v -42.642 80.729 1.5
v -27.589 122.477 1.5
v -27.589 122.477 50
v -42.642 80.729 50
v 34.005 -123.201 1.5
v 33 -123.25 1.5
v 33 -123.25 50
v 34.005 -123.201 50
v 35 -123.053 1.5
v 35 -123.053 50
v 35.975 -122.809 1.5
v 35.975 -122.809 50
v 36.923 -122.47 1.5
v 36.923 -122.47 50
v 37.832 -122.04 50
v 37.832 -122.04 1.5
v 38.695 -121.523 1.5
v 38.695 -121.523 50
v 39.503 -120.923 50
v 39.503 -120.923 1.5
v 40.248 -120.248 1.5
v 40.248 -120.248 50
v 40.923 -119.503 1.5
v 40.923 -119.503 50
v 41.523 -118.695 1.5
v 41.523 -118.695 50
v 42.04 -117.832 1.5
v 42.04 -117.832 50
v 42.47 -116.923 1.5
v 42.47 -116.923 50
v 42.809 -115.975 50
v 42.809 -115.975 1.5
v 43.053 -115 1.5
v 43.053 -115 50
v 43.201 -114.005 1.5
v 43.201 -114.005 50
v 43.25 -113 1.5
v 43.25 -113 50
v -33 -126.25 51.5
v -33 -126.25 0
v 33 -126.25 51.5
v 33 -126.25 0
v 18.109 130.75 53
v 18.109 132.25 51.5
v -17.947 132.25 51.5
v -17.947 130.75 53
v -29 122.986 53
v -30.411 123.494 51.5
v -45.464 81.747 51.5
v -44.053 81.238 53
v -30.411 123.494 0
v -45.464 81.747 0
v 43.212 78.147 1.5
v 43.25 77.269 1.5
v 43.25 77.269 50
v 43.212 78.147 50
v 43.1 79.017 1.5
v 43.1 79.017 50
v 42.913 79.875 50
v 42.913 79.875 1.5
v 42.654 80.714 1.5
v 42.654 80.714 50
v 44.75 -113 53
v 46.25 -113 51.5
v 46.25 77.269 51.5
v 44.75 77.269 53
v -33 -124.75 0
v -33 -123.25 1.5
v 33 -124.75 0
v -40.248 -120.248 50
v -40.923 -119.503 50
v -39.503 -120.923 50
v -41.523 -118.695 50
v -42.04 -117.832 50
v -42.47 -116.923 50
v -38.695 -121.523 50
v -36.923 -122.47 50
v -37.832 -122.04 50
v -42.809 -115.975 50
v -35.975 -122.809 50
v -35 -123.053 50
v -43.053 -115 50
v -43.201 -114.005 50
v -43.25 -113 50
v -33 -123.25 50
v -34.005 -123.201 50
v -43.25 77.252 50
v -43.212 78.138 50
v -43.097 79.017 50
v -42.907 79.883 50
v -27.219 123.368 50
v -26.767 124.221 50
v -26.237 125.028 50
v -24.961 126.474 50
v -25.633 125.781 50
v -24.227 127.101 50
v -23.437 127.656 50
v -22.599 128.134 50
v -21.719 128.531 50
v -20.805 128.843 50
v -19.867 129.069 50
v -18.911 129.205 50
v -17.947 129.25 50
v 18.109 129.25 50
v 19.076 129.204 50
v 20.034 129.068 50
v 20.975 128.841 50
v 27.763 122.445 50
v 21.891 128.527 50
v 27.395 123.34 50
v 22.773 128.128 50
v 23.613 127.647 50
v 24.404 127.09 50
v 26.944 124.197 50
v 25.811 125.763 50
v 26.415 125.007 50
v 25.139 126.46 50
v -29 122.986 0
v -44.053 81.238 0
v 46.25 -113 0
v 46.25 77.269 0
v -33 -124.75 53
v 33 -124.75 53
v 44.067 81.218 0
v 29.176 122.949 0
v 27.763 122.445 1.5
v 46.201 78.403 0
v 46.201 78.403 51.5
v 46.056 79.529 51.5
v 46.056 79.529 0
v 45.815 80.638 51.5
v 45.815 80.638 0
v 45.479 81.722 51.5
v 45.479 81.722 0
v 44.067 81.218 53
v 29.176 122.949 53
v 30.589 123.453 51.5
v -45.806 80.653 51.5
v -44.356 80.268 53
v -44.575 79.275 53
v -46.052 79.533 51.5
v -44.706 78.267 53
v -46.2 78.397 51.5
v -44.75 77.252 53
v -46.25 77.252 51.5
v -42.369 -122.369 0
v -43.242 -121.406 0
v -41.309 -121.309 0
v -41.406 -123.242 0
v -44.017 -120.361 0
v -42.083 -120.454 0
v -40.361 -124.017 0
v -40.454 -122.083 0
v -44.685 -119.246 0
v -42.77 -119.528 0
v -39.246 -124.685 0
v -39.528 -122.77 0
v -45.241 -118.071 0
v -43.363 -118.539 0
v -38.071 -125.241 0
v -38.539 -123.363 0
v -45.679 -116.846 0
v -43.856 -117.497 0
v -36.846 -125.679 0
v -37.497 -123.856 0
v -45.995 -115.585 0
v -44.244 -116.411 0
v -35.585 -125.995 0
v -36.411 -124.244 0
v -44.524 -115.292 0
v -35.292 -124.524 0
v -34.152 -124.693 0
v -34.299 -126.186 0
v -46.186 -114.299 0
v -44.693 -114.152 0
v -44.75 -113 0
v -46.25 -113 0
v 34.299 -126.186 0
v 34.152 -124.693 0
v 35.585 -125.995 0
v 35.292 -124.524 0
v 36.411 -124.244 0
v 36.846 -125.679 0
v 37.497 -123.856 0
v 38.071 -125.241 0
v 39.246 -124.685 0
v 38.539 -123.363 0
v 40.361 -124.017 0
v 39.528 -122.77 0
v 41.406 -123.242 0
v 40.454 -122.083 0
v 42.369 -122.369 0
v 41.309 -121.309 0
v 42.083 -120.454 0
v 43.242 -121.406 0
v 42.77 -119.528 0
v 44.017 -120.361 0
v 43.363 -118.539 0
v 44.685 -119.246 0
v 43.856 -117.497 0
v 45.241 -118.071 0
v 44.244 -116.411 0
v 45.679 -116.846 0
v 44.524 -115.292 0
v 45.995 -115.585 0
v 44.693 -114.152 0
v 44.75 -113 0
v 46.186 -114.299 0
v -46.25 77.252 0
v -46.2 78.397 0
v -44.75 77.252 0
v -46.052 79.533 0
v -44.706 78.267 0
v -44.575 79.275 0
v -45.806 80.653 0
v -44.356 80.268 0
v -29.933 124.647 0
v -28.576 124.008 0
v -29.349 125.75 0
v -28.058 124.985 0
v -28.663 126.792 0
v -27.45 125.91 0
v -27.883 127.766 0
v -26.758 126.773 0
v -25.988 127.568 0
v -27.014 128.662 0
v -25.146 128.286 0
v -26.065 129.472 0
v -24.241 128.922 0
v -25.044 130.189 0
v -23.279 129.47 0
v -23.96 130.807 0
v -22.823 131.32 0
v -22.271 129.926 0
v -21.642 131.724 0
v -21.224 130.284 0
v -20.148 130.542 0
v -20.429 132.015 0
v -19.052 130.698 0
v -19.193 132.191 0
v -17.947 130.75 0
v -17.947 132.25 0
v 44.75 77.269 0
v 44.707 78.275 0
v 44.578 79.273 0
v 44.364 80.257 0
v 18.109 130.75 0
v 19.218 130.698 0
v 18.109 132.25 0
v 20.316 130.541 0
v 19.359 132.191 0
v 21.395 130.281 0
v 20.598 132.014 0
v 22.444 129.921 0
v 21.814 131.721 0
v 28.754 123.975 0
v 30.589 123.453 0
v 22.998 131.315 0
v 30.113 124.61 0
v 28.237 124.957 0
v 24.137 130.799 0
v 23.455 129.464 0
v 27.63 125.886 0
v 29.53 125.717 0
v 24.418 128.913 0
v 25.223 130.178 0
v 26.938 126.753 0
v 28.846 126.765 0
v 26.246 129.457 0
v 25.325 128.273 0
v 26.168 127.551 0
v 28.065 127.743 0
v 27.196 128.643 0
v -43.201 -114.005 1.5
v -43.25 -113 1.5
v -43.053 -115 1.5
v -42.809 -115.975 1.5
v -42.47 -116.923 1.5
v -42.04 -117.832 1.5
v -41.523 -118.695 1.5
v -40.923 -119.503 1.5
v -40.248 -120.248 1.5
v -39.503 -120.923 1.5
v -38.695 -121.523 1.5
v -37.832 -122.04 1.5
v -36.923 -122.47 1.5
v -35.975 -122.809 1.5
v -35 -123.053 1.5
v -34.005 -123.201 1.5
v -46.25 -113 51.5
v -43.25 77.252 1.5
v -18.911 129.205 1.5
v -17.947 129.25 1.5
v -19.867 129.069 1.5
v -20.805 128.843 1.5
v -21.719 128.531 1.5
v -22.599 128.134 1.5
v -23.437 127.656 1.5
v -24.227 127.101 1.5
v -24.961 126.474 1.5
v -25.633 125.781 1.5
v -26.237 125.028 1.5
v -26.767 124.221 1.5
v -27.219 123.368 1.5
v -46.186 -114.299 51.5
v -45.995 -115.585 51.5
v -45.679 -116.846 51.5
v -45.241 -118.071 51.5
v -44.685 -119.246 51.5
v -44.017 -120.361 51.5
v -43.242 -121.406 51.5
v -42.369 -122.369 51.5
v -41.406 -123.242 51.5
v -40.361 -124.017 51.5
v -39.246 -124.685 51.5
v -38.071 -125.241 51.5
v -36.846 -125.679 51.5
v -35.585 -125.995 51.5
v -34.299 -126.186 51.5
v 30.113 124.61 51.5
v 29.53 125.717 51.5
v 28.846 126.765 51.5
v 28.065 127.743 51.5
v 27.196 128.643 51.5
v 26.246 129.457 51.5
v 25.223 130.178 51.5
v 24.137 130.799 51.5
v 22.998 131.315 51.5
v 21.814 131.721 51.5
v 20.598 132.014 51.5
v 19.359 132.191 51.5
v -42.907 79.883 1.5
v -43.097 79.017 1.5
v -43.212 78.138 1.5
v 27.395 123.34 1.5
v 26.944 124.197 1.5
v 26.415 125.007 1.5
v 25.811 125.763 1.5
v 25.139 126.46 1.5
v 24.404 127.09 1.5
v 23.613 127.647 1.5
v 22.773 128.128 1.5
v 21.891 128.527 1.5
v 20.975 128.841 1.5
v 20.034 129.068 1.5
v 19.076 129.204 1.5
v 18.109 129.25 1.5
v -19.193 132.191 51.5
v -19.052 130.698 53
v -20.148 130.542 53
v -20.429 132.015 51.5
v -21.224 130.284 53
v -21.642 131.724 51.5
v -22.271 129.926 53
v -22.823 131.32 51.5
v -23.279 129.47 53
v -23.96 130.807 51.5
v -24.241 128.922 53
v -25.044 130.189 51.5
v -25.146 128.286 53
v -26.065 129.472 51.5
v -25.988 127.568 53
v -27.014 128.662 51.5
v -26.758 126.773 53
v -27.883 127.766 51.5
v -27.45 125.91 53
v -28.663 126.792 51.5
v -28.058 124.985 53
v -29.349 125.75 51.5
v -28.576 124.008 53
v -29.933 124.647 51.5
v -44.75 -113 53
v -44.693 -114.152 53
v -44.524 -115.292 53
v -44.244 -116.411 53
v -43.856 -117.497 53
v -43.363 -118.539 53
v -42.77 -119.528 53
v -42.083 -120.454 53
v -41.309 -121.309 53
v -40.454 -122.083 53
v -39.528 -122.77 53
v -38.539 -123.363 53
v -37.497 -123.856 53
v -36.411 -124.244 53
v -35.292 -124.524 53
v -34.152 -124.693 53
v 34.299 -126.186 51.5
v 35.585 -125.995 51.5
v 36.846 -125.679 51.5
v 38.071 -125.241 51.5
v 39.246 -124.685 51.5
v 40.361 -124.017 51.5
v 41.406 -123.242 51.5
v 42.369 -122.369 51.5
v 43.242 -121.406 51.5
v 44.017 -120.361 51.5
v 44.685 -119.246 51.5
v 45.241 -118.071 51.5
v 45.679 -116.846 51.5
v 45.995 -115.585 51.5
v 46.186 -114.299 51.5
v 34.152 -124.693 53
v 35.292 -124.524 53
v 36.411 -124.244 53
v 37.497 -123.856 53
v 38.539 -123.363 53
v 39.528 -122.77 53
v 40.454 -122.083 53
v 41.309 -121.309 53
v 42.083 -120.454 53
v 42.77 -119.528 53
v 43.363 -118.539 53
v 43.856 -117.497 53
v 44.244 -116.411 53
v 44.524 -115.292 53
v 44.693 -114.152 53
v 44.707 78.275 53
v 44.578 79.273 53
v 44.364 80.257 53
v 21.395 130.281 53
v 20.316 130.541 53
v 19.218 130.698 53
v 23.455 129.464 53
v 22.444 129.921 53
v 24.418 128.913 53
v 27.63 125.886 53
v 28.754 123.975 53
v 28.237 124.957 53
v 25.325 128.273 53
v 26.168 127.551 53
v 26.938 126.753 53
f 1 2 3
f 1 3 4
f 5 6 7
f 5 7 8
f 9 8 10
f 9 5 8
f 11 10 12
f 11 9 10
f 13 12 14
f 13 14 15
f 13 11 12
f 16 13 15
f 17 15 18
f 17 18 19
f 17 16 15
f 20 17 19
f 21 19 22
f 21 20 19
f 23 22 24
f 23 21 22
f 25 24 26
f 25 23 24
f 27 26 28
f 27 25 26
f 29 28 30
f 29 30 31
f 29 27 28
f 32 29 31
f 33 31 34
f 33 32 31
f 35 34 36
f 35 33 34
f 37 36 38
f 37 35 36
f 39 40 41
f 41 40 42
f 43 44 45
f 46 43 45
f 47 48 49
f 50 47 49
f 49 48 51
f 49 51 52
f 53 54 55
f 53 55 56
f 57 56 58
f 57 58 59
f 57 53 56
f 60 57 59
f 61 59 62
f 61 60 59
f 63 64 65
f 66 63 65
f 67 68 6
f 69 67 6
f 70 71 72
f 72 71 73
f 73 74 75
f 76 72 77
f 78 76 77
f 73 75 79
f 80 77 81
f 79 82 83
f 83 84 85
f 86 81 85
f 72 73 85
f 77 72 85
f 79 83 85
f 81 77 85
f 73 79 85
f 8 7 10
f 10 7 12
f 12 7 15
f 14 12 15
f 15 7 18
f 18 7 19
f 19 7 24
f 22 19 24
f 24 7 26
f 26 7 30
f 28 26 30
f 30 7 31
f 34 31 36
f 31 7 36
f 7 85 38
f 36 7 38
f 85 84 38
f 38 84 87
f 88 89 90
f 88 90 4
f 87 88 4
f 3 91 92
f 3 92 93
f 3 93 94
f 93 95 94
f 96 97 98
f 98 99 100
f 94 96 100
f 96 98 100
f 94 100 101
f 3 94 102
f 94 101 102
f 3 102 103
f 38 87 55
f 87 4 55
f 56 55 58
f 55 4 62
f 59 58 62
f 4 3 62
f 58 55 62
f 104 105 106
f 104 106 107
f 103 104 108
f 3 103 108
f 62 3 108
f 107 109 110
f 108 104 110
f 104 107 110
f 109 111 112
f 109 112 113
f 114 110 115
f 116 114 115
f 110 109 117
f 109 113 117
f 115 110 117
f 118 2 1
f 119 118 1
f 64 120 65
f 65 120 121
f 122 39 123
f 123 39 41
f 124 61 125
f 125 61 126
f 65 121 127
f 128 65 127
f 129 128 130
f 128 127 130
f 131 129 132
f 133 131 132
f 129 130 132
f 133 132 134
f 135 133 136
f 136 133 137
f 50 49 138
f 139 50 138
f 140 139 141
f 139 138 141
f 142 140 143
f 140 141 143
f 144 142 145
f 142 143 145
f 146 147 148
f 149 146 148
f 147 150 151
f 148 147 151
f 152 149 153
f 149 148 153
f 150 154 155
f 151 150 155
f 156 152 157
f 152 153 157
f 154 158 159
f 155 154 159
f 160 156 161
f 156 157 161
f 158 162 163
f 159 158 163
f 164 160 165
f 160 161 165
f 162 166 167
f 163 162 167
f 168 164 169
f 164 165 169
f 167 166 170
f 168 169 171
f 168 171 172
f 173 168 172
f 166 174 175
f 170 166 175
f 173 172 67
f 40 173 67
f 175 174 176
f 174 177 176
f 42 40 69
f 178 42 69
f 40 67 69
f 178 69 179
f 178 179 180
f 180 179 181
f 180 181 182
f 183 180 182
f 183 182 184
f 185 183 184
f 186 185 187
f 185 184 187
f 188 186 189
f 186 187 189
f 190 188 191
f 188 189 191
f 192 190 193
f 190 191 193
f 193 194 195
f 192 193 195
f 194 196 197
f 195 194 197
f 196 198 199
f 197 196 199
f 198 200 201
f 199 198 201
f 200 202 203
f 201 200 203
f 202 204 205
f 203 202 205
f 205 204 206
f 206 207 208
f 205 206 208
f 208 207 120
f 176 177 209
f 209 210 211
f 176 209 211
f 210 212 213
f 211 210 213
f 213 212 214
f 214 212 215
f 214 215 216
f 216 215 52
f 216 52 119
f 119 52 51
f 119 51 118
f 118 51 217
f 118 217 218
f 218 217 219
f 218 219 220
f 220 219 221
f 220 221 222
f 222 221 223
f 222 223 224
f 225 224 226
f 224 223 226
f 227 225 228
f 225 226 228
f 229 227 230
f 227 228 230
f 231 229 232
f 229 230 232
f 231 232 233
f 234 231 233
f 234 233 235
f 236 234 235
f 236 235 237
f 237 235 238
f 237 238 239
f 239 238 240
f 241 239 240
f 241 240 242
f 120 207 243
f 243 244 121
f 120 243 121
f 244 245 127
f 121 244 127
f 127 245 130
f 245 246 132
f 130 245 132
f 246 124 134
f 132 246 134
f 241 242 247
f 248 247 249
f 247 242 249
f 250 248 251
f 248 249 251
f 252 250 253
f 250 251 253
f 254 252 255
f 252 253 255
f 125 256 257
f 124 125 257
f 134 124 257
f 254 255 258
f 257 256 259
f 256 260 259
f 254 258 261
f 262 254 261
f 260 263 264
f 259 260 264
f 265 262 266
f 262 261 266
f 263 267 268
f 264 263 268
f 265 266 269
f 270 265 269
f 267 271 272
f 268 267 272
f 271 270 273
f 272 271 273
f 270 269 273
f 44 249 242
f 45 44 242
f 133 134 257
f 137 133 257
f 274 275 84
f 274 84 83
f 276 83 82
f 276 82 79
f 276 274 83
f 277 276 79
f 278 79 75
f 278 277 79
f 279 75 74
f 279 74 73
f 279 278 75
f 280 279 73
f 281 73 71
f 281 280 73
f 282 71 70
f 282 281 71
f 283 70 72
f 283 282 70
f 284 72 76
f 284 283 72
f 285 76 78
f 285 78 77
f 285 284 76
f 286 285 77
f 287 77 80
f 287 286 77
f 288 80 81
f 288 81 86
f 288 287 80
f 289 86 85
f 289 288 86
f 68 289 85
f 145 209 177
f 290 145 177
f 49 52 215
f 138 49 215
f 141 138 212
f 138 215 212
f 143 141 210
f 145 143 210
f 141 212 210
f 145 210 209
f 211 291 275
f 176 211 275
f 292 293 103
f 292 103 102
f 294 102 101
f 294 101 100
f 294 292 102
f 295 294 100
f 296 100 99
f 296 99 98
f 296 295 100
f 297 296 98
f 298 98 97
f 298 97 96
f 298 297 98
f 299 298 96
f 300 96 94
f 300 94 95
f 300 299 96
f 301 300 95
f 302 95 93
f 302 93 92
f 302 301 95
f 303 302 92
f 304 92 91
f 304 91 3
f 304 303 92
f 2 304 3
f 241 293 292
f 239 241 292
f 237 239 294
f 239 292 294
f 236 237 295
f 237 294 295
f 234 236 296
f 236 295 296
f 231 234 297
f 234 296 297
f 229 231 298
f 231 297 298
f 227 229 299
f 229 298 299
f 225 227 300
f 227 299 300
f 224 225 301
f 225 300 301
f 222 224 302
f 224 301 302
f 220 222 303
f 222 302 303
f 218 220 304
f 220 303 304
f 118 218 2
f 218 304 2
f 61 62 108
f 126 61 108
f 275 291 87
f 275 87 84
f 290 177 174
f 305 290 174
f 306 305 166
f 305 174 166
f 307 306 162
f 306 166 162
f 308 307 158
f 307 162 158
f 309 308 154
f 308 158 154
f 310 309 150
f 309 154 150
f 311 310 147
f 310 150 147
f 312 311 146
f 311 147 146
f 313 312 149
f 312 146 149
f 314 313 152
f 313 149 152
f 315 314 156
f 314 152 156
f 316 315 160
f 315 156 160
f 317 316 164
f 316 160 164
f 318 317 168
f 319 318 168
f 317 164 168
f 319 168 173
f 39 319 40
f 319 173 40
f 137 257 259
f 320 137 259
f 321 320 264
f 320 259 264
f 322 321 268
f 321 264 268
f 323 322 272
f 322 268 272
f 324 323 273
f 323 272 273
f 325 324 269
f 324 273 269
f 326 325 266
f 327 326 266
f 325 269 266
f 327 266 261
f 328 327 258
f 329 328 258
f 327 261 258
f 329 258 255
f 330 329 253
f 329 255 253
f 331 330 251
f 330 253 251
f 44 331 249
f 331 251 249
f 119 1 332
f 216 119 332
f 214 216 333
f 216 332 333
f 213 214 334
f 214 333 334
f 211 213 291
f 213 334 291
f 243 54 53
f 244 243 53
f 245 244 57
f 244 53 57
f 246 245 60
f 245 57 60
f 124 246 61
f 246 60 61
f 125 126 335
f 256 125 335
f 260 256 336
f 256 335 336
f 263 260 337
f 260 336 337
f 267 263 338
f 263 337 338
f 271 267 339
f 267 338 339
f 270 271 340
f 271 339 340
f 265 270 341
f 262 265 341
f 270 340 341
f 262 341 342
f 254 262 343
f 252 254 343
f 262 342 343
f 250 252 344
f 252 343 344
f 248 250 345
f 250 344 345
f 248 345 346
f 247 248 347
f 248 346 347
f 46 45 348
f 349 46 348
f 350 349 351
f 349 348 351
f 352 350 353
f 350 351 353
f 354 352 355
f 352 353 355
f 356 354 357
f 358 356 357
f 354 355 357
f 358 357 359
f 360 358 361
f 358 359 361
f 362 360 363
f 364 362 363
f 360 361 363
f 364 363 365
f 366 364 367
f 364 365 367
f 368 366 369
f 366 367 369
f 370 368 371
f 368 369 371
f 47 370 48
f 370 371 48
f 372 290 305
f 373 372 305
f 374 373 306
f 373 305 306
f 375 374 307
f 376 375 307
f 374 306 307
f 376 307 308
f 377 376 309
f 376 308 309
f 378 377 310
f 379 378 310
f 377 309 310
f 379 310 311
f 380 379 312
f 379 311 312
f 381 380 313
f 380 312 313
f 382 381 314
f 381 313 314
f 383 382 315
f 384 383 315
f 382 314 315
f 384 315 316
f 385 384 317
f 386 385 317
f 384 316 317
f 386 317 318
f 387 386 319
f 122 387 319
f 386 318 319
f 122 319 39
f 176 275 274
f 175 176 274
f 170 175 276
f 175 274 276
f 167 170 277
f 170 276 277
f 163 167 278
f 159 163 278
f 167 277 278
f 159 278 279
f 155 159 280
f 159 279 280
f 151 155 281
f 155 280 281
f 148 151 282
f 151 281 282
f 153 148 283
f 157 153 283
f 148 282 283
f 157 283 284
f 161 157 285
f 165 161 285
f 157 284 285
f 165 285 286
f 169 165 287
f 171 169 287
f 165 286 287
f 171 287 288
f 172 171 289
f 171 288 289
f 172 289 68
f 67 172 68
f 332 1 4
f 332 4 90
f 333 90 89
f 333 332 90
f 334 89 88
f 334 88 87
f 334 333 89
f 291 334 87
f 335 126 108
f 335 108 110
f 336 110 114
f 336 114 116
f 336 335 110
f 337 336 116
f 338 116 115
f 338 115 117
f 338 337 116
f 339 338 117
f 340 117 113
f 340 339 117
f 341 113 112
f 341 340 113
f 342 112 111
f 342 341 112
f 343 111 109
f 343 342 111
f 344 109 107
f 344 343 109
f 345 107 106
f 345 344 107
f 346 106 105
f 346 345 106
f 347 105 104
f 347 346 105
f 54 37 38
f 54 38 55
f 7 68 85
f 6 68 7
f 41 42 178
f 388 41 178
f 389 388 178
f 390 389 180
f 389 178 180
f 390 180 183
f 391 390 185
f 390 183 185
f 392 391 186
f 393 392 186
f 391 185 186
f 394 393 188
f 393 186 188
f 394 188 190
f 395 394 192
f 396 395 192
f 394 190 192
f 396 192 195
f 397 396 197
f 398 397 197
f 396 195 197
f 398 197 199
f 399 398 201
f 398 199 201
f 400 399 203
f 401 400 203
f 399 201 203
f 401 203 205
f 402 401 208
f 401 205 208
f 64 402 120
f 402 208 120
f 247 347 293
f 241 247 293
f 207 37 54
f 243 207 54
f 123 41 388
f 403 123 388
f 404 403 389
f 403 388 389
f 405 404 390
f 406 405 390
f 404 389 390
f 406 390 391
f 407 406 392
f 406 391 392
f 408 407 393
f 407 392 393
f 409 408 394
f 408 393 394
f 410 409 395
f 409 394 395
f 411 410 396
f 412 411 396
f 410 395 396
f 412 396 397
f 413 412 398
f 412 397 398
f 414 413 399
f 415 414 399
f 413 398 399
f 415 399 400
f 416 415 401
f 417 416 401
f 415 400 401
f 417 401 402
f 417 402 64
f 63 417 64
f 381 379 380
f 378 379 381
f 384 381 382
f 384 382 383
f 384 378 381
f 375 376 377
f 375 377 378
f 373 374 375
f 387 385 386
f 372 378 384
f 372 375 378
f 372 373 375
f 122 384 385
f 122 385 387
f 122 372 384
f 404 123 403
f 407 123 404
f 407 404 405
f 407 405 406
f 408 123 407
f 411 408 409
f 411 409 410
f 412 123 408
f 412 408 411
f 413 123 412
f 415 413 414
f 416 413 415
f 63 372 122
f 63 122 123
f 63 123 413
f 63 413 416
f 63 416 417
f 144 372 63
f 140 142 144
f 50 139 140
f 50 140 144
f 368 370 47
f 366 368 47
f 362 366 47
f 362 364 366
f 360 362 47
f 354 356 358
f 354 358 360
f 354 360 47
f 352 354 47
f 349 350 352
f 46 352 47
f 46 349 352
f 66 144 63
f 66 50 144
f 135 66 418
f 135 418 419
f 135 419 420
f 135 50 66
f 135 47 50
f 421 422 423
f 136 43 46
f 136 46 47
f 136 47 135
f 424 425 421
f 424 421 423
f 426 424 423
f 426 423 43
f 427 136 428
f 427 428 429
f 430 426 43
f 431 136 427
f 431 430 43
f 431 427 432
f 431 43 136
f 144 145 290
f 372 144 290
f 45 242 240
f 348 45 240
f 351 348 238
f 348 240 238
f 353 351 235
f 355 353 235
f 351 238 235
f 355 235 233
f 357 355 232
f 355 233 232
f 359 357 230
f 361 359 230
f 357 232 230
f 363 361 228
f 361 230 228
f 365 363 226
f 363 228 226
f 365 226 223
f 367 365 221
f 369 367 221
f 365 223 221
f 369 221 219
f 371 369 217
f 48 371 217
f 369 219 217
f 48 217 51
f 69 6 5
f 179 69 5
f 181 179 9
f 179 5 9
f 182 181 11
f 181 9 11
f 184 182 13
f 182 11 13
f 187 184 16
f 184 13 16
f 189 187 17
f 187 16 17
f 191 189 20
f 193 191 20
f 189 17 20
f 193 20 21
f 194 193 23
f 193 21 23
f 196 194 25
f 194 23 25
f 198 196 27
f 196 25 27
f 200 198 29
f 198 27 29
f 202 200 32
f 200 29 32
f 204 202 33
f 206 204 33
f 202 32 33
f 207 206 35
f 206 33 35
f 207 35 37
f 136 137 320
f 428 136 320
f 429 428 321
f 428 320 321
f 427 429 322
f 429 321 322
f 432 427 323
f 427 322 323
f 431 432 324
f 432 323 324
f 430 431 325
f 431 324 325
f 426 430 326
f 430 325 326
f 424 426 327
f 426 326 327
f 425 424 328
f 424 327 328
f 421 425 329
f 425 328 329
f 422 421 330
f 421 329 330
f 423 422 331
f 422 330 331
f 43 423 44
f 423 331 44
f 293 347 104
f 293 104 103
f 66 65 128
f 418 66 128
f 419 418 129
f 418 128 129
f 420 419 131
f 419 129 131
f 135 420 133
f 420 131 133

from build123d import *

# Parameters (mm, degrees)
BOSS_EXTRUDE1_DEPTH = 50
BOSS_EXTRUDE2_DEPTH = 3
CHAMFER1_SIZE       = 1.5


with BuildPart() as part:
    # Sketch1 → Boss-Extrude1 (new body)
    with BuildSketch(Plane.XY):
        with BuildLine():
            Line((-46.25, 77.25220626), (-46.25, -113))
            ThreePointArc((-46.25, -113), (-42.369164851, -122.369164851), (-33, -126.25))
            Line((-33, -126.25), (33, -126.25))
            ThreePointArc((33, -126.25), (42.369164851, -122.369164851), (46.25, -113))
            Line((46.25, -113), (46.25, 77.269287137))
            ThreePointArc((46.25, 77.269287137), (46.055906569, 79.528889681), (45.479312656, 81.722292374))
            Line((45.479312656, 81.722292374), (30.588501914, 123.453005237))
            ThreePointArc((30.588501914, 123.453005237), (25.743329046, 129.829700351), (18.109189258, 132.25))
            Line((18.109189258, 132.25), (-17.946852503, 132.25))
            ThreePointArc((-17.946852503, 132.25), (-25.56302687, 129.842342367), (-30.411330997, 123.494360454))
            Line((-30.411330997, 123.494360454), (-45.464478493, 81.746566714))
            ThreePointArc((-45.464478493, 81.746566714), (-46.052142354, 79.53345153), (-46.25, 77.25220626))
        make_face()
        with BuildLine():
            ThreePointArc((-43.25, -113), (-40.247844507, -120.247844507), (-33, -123.25))
            Line((-33, -123.25), (33, -123.25))
            ThreePointArc((33, -123.25), (40.247844507, -120.247844507), (43.25, -113))
            Line((43.25, -113), (43.25, 77.269287137))
            ThreePointArc((43.25, 77.269287137), (43.099852252, 79.017281558), (42.653807903, 80.714064773))
            Line((42.653807903, 80.714064773), (27.762997162, 122.444777636))
            ThreePointArc((27.762997162, 122.444777636), (24.014844566, 127.377692725), (18.109189258, 129.25))
            Line((18.109189258, 129.25), (-17.946852503, 129.25))
            ThreePointArc((-17.946852503, 129.25), (-23.838610033, 127.387472397), (-27.589184923, 122.476769408))
            Line((-27.589184923, 122.476769408), (-42.642332419, 80.728975668))
            ThreePointArc((-42.642332419, 80.728975668), (-43.096940311, 79.016943167), (-43.25, 77.25220626))
            Line((-43.25, 77.25220626), (-43.25, -113))
        make_face(mode=Mode.SUBTRACT)
    extrude(amount=BOSS_EXTRUDE1_DEPTH)

    # Sketch3 → Boss-Extrude2 (add)
    with BuildSketch(Plane.XY.offset(50)):
        with BuildLine():
            Line((-46.25, 77.25220626), (-46.25, -113))
            ThreePointArc((-46.25, -113), (-42.369164851, -122.369164851), (-33, -126.25))
            Line((-33, -126.25), (33, -126.25))
            ThreePointArc((33, -126.25), (42.369164851, -122.369164851), (46.25, -113))
            Line((46.25, -113), (46.25, 77.269287137))
            ThreePointArc((46.25, 77.269287137), (46.055906569, 79.528889681), (45.479312656, 81.722292374))
            Line((45.479312656, 81.722292374), (30.588501914, 123.453005237))
            ThreePointArc((30.588501914, 123.453005237), (25.743329046, 129.829700351), (18.109189258, 132.25))
            Line((18.109189258, 132.25), (-17.946852503, 132.25))
            ThreePointArc((-17.946852503, 132.25), (-25.56302687, 129.842342367), (-30.411330997, 123.494360454))
            Line((-30.411330997, 123.494360454), (-45.464478493, 81.746566714))
            ThreePointArc((-45.464478493, 81.746566714), (-46.052142354, 79.53345153), (-46.25, 77.25220626))
        make_face()
    extrude(amount=BOSS_EXTRUDE2_DEPTH)

    # Chamfer1
    chamfer1_edges = [part.edges().sort_by_distance(p)[0] for p in [
        (0, -123.25, 0),
        (40.247844507, -120.247844507, 0),
        (43.25, -17.865356432, 0),
        (43.099852252, 79.017281558, 0),
        (35.208402533, 101.579421205, 0),
        (24.014844566, 127.377692725, 0),
        (0.081168378, 129.25, 0),
        (-23.838610033, 127.387472397, 0),
        (-35.115758671, 101.602872538, 0),
        (-43.096940311, 79.016943167, 0),
        (-43.25, -17.87389687, 0),
        (-40.247844507, -120.247844507, 0),
        (-46.052142354, 79.53345153, 53),
        (-46.25, -17.87389687, 53),
        (-42.369164851, -122.369164851, 53),
        (0, -126.25, 53),
        (42.369164851, -122.369164851, 53),
        (46.25, -17.865356432, 53),
        (46.055906569, 79.528889681, 53),
        (38.033907285, 102.587648806, 53),
        (25.743329046, 129.829700351, 53),
        (0.081168378, 132.25, 53),
        (-25.56302687, 129.842342367, 53),
        (-37.937904745, 102.620463584, 53),
    ]]
    chamfer(chamfer1_edges, length=CHAMFER1_SIZE)


solid = part.part
